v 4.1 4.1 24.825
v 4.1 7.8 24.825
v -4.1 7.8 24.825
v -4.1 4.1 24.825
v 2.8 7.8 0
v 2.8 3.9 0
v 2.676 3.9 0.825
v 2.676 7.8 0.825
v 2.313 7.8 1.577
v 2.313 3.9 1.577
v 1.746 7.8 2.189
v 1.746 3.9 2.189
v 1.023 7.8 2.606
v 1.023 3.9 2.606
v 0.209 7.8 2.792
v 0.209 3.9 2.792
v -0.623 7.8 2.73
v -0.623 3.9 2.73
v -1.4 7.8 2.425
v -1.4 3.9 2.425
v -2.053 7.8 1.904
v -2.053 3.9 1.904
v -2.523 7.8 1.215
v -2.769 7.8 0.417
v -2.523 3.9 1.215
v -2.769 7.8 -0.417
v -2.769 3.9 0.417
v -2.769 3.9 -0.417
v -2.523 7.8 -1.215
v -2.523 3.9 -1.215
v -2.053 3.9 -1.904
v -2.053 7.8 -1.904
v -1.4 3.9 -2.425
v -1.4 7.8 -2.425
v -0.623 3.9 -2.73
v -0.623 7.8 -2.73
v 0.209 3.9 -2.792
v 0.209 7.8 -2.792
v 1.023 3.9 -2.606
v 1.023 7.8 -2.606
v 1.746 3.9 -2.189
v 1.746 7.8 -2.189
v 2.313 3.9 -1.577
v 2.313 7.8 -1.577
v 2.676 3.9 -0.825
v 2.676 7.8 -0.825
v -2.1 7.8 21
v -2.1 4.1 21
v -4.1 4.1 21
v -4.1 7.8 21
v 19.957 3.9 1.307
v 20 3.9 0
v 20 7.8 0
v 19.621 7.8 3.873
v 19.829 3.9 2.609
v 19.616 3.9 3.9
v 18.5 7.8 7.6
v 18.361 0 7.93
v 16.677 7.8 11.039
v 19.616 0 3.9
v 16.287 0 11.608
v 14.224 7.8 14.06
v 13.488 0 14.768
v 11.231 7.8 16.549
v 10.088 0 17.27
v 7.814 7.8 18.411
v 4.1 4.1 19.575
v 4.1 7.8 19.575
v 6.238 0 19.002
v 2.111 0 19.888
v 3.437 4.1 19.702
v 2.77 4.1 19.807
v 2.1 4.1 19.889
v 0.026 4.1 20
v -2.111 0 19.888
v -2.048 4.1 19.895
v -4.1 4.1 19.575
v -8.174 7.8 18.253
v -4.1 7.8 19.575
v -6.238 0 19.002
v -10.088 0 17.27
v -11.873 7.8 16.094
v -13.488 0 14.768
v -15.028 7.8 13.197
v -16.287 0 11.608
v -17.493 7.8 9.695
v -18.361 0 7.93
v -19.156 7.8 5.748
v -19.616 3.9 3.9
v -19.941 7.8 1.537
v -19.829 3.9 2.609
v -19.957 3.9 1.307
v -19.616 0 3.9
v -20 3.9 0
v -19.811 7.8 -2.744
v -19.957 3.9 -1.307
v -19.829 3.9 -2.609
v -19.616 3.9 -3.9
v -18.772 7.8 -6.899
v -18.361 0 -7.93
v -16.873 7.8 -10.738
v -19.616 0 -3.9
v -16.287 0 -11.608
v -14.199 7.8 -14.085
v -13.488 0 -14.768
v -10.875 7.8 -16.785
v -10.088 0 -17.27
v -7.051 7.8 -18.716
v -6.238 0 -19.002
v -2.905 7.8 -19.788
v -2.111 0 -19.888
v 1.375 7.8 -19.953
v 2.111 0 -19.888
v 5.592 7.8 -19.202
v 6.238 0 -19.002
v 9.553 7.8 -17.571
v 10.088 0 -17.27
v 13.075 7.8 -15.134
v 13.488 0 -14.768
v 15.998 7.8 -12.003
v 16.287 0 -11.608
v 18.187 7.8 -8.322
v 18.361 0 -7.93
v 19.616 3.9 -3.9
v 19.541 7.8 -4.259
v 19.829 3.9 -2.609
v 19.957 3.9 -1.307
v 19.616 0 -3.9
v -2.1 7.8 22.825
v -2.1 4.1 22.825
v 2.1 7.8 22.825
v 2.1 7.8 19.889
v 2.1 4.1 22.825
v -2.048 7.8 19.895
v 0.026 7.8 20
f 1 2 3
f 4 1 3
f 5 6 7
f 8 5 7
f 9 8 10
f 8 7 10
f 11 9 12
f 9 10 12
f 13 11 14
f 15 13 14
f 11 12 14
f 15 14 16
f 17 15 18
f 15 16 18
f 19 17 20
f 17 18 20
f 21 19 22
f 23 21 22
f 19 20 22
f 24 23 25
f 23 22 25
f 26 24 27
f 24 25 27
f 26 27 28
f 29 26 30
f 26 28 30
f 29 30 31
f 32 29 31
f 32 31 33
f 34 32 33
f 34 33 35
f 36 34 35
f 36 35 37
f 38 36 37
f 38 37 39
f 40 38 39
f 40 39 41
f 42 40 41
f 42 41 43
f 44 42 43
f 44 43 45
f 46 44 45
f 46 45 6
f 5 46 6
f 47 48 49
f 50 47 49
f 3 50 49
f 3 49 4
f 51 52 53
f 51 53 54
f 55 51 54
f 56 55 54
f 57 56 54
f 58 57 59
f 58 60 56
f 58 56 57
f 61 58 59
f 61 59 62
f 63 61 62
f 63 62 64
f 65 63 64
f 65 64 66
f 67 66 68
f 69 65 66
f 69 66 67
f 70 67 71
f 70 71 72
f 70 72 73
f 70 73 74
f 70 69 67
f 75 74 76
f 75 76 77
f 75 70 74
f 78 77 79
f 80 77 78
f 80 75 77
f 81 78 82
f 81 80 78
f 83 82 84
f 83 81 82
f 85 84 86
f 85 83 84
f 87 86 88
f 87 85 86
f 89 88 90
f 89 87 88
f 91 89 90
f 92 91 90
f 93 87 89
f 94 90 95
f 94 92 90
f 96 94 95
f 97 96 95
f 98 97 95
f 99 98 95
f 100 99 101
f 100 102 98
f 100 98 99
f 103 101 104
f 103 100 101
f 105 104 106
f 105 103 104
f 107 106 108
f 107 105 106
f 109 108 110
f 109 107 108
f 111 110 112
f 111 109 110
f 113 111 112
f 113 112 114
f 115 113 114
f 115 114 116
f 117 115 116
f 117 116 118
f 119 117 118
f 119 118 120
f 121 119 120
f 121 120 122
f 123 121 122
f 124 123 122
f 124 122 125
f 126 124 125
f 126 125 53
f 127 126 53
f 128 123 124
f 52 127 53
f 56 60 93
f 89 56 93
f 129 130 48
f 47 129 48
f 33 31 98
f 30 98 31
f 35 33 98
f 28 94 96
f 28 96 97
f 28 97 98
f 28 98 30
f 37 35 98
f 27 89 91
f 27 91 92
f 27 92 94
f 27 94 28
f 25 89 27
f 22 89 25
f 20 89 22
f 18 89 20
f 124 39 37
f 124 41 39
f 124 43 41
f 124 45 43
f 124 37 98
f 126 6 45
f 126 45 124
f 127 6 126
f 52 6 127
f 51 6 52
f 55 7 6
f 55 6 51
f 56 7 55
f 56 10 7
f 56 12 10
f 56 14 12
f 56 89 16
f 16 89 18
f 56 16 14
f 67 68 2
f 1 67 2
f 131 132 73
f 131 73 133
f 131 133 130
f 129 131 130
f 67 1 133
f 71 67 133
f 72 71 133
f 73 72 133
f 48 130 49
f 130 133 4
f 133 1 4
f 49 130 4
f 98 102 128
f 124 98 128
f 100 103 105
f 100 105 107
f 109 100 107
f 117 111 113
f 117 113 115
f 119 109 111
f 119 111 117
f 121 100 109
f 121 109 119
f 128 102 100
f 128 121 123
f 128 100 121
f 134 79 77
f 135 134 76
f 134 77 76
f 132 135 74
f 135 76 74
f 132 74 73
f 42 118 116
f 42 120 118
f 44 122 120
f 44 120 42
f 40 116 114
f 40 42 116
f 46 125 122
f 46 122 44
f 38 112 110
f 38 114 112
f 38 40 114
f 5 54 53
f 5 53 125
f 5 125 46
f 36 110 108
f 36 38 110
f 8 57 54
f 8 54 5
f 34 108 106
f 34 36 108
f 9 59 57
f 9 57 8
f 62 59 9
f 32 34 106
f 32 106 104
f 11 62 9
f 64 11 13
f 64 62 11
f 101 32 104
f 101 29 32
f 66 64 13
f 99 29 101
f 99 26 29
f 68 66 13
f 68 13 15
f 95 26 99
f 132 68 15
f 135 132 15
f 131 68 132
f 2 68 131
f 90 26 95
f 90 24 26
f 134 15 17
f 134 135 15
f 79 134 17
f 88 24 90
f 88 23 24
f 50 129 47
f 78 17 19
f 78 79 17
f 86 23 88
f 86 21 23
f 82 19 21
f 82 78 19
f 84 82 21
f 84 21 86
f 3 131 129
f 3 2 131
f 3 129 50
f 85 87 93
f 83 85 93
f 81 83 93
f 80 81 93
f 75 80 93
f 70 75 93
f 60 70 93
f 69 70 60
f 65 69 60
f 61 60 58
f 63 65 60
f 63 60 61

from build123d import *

# Parameters (mm, degrees)
F0_R     = 20
F1_DEPTH = 7.8
F3_DEPTH = 3.9
F4_R     = 2.8
F5_DEPTH = 3.901
F6_W     = 8.2
F6_H     = 5.25
F7_DEPTH = 3.7
F9_DEPTH = 3.701


with BuildPart() as f1:
    # F0 (on Front) → F1 (new body)
    with BuildSketch(Plane.XZ):
        Circle(F0_R)
    extrude(amount=-F1_DEPTH)

    # F2 (on face) → F3 (cut)
    with BuildSketch(Plane.XZ):
        with BuildLine():
            Line((19.6160648449, 3.9), (-19.6160648449, 3.9))
            ThreePointArc((-19.6160648449, 3.9), (-19.903784777, 1.9594263321), (-20, 0))
            ThreePointArc((-20, 0), (-19.903784777, -1.9594263321), (-19.6160648449, -3.9))
            Line((-19.6160648449, -3.9), (19.6160648449, -3.9))
            ThreePointArc((19.6160648449, -3.9), (19.903784777, -1.9594263321), (20, 0))
            ThreePointArc((20, 0), (19.903784777, 1.9594263321), (19.6160648449, 3.9))
        make_face()
    extrude(amount=-F3_DEPTH, mode=Mode.SUBTRACT)

    # F4 (on face) → F5 (cut, through all)
    with BuildSketch(Plane.XZ.offset(-3.9)):
        Circle(F4_R)
    extrude(amount=-F5_DEPTH, mode=Mode.SUBTRACT)

    # F6 (on face) → F7 (join)
    with BuildSketch(Plane(origin=(0, 7.8, 0), x_dir=(-1, 0, 0), z_dir=(0, 1, 0))):
        with Locations((0, 22.2002394621)):
            Rectangle(F6_W, F6_H)
    extrude(amount=-F7_DEPTH)

    # F8 (on face) → F9 (cut, through all)
    with BuildSketch(Plane.XZ.offset(-4.1)):
        with BuildLine():
            Line((-2.1, 22.8252394621), (-2.1, 22.2002394621))
            Line((-2.1, 22.2002394621), (-2.1, 21))
            Line((-2.1, 21), (-4.1, 21))
            Line((-4.1, 21), (-4.1, 19.5752394621))
            ThreePointArc((-4.1, 19.5752394621), (-1.012265376, 19.9743665434), (2.1, 19.8894444367))
            Line((2.1, 19.8894444367), (2.1, 22.8252394621))
            Line((2.1, 22.8252394621), (-2.1, 22.8252394621))
        make_face()
    extrude(amount=-F9_DEPTH, mode=Mode.SUBTRACT)


solid = f1.part
